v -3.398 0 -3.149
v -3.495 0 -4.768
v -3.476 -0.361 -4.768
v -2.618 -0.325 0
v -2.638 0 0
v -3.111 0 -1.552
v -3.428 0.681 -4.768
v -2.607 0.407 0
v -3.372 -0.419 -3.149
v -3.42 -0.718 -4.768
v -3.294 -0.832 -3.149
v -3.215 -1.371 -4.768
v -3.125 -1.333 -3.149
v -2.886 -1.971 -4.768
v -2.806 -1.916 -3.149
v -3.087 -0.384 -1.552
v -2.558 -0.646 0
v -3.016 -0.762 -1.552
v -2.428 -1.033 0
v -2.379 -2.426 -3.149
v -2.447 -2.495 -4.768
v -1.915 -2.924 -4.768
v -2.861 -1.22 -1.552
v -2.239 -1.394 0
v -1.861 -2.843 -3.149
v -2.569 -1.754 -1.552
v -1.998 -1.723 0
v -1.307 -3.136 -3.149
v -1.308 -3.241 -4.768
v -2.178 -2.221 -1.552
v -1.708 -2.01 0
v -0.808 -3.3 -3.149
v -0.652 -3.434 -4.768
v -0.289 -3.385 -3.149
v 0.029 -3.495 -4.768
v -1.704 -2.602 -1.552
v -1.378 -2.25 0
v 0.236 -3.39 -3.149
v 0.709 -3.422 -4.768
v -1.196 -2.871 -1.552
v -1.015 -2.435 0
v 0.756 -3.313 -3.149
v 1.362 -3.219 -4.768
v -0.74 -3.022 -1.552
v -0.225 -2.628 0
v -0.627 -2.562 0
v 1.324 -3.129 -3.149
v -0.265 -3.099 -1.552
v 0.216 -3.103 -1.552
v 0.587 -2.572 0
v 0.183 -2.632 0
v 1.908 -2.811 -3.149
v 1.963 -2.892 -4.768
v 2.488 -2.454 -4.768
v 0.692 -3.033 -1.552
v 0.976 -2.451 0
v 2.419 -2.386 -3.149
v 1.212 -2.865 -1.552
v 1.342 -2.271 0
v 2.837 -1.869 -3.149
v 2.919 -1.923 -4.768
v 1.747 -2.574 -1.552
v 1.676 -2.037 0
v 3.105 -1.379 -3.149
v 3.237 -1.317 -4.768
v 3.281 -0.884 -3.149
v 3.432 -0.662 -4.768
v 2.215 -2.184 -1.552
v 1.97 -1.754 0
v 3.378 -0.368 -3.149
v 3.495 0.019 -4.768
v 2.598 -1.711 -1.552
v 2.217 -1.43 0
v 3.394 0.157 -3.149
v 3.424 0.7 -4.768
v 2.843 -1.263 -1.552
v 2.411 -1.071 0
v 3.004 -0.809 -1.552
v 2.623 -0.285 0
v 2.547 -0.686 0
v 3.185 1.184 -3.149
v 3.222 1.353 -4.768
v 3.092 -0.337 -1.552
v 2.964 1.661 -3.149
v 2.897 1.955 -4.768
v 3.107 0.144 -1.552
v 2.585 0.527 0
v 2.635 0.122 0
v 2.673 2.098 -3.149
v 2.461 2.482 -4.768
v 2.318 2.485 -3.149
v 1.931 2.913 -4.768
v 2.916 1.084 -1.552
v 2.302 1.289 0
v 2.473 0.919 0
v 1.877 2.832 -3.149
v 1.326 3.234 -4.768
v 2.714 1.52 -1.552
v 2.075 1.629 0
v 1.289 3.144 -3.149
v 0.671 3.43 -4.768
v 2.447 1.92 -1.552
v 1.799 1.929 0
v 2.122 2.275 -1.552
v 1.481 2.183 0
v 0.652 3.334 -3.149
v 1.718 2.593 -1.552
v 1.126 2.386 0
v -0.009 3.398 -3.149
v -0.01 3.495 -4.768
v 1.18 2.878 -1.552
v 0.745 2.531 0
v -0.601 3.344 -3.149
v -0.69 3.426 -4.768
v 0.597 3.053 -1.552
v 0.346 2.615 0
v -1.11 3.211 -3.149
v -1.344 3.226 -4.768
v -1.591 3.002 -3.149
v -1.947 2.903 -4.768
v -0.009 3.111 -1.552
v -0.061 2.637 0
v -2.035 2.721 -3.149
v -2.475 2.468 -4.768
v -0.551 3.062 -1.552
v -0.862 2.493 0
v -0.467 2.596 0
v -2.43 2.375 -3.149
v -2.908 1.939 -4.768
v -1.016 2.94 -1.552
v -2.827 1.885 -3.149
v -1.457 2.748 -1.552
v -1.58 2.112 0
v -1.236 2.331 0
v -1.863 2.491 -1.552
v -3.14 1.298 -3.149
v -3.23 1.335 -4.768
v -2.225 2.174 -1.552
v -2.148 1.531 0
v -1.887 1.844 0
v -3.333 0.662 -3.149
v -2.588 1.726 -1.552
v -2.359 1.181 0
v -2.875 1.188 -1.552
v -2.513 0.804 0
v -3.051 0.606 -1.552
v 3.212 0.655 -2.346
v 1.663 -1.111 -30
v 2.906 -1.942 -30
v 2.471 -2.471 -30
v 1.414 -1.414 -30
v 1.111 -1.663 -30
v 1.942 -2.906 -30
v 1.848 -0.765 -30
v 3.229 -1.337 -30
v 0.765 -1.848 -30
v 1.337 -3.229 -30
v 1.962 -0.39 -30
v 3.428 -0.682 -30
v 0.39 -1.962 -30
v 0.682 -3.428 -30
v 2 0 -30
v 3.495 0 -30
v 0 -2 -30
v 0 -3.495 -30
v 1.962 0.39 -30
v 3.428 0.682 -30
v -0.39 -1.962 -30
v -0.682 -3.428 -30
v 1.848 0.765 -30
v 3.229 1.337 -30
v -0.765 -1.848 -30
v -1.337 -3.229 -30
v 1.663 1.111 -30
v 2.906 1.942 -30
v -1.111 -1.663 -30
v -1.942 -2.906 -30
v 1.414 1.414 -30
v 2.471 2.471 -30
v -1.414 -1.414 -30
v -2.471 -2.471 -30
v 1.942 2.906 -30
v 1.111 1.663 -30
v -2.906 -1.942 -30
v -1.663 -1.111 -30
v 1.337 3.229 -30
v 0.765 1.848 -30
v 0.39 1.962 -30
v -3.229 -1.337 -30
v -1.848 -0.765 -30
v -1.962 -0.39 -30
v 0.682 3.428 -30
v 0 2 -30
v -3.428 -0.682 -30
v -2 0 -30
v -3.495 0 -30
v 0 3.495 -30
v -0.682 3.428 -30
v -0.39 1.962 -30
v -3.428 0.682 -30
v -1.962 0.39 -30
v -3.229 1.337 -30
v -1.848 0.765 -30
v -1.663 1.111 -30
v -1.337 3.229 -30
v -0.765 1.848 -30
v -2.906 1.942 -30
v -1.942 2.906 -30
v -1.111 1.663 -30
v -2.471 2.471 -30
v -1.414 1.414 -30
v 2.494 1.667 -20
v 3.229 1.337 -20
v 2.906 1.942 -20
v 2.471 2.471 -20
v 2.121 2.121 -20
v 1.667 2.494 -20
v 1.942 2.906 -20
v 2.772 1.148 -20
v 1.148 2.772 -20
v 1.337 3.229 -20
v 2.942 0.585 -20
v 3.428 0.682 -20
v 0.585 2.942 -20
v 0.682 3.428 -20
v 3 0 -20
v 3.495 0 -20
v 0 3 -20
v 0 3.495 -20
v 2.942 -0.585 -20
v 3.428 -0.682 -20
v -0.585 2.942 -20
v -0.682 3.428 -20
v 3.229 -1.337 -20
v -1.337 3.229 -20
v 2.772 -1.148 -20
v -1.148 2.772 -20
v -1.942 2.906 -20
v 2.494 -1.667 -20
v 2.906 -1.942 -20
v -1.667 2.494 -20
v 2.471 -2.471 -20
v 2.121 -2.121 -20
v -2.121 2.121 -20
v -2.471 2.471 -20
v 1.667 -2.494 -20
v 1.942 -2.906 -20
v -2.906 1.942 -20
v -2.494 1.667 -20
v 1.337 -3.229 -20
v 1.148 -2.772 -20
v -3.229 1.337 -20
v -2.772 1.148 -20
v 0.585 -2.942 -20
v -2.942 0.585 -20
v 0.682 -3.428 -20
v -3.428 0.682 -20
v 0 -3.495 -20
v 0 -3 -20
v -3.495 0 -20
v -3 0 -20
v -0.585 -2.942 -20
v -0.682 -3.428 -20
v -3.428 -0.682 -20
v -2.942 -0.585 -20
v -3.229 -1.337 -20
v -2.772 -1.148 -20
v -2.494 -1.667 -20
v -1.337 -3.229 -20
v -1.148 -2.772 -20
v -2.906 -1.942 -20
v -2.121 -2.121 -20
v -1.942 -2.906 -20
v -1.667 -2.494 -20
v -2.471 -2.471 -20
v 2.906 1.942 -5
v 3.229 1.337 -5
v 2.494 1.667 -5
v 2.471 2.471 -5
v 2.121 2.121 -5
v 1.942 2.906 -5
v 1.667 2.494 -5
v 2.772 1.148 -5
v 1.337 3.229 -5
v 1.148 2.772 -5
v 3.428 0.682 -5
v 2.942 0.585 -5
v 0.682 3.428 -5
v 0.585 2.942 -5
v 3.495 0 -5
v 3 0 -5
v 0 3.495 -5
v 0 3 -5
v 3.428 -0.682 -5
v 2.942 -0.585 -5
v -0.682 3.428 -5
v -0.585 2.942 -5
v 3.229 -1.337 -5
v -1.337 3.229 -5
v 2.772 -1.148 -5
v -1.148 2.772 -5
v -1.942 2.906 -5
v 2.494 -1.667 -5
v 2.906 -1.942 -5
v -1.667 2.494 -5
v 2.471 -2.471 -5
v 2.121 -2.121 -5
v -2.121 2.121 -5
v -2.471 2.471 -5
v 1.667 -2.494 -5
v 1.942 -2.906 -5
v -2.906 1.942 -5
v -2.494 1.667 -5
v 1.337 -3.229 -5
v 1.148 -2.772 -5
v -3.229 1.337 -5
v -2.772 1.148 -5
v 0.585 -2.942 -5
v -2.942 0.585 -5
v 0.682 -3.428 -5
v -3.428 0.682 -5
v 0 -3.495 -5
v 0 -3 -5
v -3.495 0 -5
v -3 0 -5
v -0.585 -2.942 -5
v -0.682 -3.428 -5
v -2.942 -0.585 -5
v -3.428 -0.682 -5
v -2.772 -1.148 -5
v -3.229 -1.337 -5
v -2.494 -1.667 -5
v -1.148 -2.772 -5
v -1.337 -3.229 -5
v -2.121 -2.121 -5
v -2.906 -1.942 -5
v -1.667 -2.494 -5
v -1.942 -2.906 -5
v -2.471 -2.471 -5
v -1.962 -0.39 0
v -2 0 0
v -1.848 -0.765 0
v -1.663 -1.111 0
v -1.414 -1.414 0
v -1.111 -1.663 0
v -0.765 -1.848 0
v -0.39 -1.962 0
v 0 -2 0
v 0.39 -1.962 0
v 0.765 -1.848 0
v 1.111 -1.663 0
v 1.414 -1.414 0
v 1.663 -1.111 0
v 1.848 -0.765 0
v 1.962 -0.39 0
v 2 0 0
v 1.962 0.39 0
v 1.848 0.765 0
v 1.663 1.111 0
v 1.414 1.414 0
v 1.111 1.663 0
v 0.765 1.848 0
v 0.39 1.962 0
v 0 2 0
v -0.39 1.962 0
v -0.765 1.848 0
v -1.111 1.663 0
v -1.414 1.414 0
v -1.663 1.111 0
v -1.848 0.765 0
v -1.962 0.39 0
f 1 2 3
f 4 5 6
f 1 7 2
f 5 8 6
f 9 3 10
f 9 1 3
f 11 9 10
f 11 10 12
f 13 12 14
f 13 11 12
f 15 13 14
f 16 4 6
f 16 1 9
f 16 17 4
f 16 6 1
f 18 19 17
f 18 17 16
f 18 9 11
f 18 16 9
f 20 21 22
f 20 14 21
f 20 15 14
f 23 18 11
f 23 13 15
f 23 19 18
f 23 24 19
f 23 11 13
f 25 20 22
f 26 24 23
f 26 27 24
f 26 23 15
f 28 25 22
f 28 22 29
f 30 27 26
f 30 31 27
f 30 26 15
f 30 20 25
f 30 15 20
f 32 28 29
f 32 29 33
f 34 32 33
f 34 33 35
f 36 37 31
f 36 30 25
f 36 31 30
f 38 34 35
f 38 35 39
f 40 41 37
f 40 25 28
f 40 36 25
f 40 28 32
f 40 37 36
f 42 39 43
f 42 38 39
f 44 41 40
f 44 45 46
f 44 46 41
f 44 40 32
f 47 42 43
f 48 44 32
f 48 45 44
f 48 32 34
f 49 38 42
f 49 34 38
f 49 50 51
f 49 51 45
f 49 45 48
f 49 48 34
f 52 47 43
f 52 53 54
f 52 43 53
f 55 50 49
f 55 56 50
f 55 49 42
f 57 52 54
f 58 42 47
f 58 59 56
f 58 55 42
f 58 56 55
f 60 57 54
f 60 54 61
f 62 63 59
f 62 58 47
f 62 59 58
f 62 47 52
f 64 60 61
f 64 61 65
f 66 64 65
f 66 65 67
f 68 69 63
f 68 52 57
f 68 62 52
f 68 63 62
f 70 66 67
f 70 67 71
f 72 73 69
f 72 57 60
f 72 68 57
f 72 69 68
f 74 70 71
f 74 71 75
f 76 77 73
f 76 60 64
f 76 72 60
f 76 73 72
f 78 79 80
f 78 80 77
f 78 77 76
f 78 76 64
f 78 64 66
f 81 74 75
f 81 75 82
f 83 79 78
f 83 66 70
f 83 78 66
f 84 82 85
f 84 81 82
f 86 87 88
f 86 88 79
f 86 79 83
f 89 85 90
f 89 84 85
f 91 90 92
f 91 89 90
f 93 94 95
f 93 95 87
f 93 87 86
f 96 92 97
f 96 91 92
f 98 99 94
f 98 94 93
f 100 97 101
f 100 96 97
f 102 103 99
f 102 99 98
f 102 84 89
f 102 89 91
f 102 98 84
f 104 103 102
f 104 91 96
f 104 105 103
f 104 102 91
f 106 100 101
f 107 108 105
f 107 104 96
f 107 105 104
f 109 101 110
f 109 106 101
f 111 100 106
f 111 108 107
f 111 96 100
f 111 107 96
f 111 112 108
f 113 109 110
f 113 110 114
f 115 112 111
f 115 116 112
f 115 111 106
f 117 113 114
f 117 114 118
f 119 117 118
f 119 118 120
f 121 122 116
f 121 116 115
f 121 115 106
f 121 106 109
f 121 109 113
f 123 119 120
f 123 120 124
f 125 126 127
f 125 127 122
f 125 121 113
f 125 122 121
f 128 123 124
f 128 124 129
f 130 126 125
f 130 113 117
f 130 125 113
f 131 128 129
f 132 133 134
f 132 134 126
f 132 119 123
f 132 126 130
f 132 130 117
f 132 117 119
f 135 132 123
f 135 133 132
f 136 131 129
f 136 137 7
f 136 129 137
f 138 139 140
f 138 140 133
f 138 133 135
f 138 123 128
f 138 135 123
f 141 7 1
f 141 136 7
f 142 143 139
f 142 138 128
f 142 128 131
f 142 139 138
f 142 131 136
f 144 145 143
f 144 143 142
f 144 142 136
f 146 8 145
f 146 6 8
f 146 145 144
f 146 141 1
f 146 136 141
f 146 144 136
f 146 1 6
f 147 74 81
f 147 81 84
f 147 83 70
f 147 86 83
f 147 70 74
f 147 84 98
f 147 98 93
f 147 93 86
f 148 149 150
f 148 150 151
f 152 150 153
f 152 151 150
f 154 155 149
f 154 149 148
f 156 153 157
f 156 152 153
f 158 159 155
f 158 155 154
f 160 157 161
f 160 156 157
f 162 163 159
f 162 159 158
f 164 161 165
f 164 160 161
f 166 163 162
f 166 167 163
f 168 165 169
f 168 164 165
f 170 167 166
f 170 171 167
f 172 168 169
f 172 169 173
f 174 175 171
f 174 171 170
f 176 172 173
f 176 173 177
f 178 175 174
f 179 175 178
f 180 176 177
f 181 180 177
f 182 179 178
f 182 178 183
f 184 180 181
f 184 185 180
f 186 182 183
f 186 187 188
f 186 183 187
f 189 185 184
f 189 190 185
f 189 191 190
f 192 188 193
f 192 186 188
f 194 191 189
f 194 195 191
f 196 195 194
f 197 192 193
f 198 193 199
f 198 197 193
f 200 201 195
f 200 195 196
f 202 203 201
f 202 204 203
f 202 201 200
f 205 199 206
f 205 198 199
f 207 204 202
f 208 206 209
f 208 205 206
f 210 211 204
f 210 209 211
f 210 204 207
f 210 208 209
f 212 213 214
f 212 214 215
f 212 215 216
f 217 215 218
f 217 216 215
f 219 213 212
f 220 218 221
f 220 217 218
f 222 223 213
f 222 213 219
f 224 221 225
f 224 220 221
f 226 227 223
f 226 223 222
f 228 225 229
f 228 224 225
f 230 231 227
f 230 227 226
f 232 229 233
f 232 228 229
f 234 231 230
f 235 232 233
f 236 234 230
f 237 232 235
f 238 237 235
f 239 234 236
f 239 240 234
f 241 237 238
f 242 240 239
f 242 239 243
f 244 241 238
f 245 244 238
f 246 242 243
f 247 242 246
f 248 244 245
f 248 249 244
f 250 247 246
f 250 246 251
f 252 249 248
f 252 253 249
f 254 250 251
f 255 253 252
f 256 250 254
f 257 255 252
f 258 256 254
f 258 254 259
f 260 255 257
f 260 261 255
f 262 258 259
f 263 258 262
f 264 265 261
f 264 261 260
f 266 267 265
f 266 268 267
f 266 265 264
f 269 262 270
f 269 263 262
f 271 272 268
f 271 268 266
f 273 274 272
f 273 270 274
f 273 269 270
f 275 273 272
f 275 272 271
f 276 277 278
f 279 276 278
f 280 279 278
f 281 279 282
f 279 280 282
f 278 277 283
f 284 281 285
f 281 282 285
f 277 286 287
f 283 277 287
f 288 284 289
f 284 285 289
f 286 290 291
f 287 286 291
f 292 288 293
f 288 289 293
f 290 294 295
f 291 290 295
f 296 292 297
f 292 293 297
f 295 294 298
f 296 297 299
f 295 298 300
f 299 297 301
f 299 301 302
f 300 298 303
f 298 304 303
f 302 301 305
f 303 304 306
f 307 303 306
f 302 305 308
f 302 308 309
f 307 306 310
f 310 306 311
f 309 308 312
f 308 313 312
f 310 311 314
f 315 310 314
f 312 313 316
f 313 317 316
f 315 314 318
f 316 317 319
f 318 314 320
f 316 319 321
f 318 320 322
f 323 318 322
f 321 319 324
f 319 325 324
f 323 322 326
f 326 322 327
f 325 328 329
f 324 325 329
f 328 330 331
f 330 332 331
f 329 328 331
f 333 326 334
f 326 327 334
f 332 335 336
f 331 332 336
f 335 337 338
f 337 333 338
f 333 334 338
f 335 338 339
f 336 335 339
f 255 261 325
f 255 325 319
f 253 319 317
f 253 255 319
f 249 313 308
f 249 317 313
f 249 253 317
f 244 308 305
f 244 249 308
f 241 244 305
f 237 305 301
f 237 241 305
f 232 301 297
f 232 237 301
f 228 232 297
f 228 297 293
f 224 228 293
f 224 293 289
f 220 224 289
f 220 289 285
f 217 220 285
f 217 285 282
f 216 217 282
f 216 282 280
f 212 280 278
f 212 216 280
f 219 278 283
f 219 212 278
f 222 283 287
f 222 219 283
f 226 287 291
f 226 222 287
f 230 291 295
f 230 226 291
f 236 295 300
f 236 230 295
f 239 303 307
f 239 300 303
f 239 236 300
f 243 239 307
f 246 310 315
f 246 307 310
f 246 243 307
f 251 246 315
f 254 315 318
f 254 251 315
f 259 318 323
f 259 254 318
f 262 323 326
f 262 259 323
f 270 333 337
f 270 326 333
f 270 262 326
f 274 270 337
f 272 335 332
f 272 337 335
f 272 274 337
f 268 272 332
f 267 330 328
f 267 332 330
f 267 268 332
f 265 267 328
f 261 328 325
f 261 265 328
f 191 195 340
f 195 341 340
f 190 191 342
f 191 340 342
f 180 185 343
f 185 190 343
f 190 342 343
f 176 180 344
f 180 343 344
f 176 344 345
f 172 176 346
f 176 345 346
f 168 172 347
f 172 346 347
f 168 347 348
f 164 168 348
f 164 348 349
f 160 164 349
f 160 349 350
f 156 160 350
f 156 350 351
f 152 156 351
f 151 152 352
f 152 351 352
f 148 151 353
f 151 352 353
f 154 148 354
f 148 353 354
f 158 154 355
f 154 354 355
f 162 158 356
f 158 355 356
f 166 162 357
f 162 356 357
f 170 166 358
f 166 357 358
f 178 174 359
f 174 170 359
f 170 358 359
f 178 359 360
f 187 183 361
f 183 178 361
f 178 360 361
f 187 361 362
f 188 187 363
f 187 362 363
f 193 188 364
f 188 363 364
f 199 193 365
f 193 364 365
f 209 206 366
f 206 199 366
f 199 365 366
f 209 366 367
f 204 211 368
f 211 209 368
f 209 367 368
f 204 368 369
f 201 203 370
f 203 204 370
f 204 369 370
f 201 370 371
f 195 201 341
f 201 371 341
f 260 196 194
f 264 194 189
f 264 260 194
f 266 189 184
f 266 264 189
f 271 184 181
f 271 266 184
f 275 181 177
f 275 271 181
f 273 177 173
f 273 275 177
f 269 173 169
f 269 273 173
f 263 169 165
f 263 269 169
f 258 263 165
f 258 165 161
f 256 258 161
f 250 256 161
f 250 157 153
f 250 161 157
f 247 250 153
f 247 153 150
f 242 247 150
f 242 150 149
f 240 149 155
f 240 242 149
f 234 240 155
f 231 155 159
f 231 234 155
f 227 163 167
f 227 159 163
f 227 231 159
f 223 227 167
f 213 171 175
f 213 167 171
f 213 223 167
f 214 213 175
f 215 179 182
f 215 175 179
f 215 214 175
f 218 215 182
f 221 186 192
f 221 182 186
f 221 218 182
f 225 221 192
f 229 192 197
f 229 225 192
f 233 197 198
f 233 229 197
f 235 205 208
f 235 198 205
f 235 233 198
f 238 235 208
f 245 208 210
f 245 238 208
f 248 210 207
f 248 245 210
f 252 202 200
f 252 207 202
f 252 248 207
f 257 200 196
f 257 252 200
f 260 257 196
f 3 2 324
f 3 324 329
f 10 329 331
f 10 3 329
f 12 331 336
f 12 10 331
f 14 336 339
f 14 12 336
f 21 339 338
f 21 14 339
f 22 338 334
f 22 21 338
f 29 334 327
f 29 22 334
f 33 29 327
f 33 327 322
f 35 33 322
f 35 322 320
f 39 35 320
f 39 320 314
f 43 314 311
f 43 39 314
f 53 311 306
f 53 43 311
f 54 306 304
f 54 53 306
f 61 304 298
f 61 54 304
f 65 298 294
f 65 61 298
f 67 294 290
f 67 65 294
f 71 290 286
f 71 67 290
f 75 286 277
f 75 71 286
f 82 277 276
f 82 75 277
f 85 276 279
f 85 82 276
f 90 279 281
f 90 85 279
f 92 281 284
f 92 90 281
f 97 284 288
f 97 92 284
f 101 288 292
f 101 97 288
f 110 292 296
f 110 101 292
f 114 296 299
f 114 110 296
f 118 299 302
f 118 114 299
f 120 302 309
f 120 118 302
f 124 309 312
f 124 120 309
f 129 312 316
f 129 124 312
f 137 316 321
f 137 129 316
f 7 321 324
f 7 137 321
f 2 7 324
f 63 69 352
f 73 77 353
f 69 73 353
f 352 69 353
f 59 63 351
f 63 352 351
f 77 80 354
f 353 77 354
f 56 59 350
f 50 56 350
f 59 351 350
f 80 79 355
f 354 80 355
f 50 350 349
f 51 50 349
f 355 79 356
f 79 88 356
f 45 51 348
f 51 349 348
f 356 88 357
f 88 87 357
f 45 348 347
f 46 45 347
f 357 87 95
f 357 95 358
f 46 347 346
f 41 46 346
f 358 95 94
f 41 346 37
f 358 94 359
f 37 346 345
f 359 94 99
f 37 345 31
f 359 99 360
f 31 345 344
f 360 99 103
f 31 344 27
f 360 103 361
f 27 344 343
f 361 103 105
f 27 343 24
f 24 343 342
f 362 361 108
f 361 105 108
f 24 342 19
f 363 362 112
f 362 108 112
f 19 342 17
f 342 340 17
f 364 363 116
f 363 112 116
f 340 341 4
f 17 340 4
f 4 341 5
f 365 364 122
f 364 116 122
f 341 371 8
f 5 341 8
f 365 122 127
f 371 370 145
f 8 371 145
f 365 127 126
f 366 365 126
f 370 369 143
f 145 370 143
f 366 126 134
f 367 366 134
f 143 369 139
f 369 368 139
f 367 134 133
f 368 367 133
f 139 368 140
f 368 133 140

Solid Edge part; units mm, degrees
sketch "Sketch1" plane through (0, 0, 0) normal (0, 0, -1) x (-1, 0, 0)
  circle A0 centre (0, 0) radius 2
  circle A1 centre (0, 0) radius 3.495
extrude "Protrusion1" add sketch "Sketch1" along normal blind 30
sketch "Sketch2" plane through (0, 0, 0) normal (0, -1, 0) x (1, 0, 0)
  line L0 (-7.0834, -20) -> (-7.0834, -5)
  line L1 (-7.0834, -5) -> (-3, -5)
  line L2 (-3, -5) -> (-3, -20)
  line L3 (-3, -20) -> (-7.0834, -20)
  arc A0 (-3.495, -4.7834) -> (-2.2003, 1.0477) centre (10.2833, -4.7834) cw
  line L4 (-2.2003, 1.0477) -> (-7.5454, 0.1871)
  line L5 (-7.5454, 0.1871) -> (-7.0698, -4.6128)
  line L6 (-7.0698, -4.6128) -> (-3.495, -4.7834)
revolve "RevolvedCutout1" cut sketch "Sketch2" angle 360 about axis through (0, 0, 0) along (0, 0, 1)
properties material "Réz, sárgaréz"
